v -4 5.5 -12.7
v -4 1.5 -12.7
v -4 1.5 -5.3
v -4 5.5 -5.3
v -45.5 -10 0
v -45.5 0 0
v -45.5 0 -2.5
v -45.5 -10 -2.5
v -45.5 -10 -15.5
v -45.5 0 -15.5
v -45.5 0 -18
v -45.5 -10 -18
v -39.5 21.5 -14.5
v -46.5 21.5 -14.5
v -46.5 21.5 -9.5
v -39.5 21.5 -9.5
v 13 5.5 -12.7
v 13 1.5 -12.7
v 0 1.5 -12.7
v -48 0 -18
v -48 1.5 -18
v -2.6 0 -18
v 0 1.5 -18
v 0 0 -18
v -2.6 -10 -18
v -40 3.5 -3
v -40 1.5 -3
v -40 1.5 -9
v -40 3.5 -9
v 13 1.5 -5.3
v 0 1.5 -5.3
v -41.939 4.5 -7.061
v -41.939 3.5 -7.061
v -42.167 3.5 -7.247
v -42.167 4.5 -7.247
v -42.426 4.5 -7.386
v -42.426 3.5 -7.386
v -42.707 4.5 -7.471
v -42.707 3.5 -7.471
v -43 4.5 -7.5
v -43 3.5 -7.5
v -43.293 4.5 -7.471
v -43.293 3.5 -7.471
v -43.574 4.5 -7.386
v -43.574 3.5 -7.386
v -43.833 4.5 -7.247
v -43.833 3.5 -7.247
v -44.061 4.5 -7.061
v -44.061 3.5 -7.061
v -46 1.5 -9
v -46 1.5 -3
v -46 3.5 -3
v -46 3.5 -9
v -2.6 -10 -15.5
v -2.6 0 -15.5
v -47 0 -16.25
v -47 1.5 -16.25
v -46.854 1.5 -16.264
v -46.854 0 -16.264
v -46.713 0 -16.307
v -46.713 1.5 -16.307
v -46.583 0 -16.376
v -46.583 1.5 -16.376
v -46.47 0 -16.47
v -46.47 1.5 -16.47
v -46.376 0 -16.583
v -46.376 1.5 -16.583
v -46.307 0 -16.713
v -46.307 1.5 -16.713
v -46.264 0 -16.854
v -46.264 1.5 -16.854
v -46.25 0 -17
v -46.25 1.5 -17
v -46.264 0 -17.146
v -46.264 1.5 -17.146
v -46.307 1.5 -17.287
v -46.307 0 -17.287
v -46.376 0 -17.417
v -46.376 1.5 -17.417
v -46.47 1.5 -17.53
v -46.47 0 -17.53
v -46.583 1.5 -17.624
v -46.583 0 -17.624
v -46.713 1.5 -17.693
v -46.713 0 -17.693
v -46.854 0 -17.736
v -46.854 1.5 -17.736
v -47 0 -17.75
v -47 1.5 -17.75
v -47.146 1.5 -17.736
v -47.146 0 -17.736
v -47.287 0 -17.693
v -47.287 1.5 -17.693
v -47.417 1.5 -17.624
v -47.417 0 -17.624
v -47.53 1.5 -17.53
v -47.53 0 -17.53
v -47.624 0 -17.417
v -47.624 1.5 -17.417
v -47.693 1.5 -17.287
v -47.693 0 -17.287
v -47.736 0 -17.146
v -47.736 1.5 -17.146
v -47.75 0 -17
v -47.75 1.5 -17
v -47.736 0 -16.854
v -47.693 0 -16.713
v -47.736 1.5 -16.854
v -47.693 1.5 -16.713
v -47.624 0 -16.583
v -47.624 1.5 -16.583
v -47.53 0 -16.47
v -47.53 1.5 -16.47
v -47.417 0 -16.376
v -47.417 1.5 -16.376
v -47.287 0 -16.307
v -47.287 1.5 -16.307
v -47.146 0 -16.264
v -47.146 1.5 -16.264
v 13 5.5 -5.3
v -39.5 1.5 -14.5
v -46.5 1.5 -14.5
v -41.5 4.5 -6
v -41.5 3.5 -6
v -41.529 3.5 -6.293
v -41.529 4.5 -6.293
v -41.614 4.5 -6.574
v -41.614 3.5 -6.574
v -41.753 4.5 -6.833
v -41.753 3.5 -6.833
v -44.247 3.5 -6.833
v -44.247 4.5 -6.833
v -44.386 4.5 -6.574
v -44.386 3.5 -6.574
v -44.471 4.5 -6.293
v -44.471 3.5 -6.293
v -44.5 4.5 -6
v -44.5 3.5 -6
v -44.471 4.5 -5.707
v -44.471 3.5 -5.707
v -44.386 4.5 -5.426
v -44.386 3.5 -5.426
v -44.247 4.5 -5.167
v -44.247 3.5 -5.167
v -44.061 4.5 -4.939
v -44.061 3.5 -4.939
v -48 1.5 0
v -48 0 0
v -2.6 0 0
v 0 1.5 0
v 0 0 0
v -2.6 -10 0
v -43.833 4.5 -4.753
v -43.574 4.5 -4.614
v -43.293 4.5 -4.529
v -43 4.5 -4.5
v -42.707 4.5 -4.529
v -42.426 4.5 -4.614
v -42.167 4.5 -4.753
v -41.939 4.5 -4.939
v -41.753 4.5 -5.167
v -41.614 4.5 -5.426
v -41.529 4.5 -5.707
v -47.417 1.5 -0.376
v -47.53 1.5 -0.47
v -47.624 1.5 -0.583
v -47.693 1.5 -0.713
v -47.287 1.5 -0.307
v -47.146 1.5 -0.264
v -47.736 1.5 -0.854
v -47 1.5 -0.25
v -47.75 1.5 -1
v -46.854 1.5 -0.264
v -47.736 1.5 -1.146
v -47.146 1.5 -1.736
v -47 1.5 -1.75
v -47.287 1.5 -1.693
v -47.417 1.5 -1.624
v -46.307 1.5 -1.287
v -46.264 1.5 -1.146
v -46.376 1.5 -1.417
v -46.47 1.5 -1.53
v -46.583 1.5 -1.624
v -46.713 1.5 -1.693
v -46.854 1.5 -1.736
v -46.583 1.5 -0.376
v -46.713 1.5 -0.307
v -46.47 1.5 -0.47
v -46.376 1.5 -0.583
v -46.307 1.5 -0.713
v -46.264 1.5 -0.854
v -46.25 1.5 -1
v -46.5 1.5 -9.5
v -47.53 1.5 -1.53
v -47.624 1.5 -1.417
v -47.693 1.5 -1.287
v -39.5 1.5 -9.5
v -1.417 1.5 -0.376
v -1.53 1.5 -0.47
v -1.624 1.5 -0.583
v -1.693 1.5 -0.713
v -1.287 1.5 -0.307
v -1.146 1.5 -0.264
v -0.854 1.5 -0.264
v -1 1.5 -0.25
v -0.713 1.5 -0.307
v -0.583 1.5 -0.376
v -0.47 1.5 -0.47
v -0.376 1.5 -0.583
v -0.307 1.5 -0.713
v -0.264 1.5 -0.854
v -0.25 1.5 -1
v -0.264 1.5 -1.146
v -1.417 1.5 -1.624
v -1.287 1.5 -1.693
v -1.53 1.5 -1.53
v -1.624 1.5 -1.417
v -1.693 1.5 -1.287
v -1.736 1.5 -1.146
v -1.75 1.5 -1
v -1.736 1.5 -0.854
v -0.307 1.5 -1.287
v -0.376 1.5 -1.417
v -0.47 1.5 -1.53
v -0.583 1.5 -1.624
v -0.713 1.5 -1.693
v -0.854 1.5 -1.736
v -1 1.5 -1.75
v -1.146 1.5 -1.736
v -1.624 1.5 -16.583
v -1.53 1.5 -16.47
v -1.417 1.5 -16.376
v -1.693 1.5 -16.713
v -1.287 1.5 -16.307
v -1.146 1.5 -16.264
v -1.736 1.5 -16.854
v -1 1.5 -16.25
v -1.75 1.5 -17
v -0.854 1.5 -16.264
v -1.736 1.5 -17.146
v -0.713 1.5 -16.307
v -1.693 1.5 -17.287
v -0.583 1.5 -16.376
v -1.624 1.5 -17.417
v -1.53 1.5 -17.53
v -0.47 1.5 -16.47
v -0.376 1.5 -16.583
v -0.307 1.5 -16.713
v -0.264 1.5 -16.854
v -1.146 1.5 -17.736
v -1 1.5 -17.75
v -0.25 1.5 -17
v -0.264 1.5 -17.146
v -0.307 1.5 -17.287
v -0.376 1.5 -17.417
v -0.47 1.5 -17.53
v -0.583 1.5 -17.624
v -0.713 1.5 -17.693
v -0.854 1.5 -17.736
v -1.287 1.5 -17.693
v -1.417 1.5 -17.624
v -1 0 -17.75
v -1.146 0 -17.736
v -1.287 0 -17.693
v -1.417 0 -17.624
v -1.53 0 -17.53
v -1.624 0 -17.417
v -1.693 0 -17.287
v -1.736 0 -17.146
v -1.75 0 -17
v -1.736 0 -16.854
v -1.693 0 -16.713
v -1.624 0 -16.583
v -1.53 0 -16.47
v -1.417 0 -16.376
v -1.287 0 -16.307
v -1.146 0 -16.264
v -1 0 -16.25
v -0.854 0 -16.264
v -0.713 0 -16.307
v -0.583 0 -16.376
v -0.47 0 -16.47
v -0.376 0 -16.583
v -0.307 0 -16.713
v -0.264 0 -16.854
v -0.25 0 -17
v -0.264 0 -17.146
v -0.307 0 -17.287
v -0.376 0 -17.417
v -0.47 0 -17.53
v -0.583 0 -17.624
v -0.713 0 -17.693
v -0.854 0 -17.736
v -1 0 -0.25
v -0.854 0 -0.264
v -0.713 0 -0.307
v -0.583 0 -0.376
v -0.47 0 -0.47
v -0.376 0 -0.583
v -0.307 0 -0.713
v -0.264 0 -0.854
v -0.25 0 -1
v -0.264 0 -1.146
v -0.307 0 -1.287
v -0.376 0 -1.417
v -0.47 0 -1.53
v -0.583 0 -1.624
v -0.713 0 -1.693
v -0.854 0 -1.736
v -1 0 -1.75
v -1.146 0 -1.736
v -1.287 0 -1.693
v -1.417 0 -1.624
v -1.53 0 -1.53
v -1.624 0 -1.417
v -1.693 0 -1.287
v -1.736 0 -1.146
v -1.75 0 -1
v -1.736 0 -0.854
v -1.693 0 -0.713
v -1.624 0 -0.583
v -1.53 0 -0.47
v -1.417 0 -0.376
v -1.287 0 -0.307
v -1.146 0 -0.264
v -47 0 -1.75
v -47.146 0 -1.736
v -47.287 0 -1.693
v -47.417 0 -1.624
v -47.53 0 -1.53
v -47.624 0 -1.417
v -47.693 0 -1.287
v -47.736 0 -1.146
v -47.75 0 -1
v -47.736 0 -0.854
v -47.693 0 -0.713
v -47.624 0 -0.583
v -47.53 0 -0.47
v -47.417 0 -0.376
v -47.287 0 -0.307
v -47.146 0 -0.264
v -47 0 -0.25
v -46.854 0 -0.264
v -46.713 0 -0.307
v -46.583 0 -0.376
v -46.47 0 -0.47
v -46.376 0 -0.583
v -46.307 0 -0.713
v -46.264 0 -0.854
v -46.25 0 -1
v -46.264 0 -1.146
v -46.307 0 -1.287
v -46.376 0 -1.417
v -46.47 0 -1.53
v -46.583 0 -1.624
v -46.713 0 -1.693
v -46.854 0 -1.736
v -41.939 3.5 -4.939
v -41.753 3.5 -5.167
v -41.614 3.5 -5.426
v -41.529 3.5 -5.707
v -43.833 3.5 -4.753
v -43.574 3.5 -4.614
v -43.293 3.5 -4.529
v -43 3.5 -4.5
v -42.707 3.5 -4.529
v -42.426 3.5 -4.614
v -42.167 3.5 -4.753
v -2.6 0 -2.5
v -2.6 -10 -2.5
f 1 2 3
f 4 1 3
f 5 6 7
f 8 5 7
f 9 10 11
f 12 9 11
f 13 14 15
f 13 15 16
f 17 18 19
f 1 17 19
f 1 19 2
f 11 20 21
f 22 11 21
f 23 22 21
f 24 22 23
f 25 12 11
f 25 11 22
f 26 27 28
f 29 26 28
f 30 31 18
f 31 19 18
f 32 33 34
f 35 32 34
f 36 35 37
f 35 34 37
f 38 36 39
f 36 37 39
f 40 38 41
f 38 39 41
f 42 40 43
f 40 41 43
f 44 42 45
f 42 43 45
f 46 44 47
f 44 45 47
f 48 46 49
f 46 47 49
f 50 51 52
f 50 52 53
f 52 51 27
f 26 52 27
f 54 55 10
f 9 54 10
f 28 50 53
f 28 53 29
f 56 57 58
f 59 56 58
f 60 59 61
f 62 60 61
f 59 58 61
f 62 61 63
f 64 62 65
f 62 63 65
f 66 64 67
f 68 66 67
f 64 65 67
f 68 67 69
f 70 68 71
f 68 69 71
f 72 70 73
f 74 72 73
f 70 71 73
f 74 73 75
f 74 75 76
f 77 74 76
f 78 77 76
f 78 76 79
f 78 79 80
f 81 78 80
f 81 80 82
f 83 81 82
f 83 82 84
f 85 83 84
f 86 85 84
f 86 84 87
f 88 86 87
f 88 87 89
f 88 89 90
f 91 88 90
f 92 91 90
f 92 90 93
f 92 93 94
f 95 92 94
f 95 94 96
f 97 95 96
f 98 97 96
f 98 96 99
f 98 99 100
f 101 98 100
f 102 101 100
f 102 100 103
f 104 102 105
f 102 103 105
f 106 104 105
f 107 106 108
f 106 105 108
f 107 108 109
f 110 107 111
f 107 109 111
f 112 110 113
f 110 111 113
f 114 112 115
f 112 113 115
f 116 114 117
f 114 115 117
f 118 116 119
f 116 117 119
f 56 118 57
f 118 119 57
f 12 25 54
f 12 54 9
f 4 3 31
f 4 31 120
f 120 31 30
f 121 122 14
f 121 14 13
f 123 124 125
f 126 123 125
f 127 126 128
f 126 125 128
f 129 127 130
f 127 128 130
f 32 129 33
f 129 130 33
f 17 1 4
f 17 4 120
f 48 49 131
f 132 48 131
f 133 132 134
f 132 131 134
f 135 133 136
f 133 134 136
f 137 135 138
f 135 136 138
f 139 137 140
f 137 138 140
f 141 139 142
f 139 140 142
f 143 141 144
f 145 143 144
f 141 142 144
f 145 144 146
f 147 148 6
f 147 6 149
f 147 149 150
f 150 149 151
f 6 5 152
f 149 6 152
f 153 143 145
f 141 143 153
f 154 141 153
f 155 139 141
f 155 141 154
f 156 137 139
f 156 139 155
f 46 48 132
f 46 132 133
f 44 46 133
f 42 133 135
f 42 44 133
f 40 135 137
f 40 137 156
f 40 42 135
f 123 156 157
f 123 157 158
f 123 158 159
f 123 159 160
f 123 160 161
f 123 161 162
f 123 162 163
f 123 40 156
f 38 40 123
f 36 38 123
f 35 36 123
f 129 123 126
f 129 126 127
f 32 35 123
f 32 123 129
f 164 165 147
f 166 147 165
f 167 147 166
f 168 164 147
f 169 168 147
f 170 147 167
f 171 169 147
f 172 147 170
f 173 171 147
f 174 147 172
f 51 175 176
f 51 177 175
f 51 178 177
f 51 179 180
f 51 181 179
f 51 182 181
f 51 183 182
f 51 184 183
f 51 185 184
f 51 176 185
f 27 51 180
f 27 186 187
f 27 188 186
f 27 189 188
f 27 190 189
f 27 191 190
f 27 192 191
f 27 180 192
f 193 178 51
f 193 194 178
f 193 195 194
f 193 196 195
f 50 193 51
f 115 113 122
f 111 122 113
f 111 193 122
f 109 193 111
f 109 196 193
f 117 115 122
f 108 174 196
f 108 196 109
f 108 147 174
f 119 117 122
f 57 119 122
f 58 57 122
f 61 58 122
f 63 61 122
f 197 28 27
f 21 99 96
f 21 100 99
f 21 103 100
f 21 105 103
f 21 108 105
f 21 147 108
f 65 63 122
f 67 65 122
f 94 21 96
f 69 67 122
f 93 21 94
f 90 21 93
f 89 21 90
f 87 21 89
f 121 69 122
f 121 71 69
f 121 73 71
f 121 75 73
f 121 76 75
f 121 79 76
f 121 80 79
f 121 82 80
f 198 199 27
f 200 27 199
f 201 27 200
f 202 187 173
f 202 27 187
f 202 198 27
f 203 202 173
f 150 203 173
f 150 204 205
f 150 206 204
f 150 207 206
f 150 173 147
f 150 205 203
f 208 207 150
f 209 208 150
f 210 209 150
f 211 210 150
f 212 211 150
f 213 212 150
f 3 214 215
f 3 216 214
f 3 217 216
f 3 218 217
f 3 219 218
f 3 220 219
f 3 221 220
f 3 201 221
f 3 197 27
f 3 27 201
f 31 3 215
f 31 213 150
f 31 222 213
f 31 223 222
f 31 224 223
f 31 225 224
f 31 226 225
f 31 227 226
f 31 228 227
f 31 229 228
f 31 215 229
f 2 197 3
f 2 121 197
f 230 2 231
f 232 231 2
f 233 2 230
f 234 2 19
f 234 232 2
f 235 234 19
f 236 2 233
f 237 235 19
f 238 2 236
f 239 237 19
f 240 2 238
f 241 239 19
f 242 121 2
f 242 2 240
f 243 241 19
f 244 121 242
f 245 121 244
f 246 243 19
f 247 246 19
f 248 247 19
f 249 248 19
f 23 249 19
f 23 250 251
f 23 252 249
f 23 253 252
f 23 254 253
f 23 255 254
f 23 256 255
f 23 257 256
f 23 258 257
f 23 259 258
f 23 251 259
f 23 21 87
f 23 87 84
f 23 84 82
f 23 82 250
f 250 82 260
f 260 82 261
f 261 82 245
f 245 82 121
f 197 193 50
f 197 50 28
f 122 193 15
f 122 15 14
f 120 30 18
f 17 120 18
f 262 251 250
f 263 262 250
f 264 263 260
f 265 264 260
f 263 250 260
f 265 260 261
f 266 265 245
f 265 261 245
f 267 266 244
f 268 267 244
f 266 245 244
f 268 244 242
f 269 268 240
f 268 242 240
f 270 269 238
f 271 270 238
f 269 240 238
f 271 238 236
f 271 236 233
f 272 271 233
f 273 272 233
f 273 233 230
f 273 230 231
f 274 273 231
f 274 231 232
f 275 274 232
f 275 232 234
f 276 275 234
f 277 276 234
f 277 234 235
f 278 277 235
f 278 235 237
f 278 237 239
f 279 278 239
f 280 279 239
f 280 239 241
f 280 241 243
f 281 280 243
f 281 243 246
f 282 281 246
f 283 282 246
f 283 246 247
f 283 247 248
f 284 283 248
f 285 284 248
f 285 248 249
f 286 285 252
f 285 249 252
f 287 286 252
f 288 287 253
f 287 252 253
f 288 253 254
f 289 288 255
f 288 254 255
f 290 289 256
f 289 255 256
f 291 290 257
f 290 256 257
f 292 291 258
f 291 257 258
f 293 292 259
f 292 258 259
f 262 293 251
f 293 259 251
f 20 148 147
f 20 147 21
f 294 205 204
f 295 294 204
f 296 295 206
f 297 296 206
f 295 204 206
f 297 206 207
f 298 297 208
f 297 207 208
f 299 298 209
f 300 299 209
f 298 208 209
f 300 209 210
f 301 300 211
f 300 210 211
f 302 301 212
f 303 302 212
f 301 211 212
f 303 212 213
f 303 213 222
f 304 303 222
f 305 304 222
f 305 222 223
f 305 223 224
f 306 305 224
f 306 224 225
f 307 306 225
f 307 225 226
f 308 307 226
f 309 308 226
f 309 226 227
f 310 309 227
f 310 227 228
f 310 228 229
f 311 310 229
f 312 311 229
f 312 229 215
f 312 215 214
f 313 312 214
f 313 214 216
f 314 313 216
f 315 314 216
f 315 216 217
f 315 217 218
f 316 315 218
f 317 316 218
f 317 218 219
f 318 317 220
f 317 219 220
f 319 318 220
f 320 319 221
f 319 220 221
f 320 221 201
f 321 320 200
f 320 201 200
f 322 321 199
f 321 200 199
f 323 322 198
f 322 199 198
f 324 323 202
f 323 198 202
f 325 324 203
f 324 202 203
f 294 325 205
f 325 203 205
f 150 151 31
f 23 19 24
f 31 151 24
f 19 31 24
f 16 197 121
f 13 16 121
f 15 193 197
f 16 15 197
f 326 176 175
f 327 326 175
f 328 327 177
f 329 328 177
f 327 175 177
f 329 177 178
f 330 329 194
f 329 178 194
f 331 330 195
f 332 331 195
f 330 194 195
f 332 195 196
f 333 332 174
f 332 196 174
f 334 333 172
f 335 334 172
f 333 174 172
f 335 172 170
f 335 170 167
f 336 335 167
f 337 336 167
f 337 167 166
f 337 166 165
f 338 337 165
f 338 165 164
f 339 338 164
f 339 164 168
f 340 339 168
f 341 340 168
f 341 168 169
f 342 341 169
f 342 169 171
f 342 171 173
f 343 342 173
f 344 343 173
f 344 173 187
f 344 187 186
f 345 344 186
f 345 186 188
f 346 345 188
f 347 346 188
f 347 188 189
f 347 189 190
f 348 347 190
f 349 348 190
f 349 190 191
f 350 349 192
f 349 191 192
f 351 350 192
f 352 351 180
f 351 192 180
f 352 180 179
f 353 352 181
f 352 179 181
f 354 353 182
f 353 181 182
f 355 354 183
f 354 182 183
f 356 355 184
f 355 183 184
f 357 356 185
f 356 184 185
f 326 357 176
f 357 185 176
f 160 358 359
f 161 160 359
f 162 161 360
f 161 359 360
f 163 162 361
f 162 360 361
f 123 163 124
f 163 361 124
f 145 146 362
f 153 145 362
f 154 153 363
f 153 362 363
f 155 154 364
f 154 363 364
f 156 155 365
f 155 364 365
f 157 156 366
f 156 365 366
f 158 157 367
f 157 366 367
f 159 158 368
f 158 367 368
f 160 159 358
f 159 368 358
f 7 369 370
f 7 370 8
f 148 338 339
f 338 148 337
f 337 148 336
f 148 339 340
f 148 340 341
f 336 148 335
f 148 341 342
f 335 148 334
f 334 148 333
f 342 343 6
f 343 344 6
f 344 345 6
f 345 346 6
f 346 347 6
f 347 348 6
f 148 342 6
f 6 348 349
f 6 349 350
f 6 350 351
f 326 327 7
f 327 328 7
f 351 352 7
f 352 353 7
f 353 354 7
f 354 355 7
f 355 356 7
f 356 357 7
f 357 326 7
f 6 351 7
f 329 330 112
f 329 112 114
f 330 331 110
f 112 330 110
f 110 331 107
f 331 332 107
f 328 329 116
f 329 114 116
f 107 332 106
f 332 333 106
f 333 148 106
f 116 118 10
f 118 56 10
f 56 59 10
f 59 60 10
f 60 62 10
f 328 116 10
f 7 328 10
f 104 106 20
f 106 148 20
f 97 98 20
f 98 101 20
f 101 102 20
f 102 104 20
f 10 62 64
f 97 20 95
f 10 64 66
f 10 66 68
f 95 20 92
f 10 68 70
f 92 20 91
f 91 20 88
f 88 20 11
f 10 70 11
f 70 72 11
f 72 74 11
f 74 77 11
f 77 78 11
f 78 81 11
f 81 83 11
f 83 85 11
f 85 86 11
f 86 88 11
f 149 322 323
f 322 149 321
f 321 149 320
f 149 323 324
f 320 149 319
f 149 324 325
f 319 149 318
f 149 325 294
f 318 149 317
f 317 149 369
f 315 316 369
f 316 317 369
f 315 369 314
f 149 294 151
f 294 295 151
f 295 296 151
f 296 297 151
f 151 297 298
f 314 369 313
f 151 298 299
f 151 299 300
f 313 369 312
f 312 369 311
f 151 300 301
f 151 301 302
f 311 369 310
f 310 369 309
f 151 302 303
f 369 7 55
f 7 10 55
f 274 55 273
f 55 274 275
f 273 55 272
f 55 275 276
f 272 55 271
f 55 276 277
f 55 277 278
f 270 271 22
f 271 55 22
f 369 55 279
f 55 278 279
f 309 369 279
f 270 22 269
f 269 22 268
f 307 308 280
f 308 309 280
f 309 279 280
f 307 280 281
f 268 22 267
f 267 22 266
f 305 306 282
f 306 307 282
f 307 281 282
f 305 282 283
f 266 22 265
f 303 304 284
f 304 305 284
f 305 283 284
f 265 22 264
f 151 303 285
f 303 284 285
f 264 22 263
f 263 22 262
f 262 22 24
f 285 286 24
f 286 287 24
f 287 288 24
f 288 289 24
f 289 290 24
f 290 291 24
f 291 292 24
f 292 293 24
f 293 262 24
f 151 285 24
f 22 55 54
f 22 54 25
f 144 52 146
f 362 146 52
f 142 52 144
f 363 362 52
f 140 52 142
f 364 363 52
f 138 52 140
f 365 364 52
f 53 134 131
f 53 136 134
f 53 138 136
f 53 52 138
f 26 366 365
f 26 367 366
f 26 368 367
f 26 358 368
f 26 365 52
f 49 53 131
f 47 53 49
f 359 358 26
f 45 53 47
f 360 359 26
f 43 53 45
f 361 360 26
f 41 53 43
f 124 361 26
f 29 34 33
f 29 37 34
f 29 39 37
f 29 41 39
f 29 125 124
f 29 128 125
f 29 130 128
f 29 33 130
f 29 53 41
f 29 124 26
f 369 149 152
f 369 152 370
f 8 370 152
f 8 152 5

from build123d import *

# Parameters (mm, degrees)
SKETCH_1_W          = 48
SKETCH_1_H          = 18
EXTRUDE_1_DEPTH     = 1.5
EXTRUDE_2_DEPTH     = 4
SKETCH_4_W          = 42.9
SKETCH_4_H          = 2.5
EXTRUDE_3_DEPTH     = 10
SKETCH_5_W          = 7
SKETCH_5_H          = 5
EXTRUDE_4_DEPTH     = 20
SKETCH_6_W          = 6
SKETCH_6_H          = 6
EXTRUDE_5_DEPTH     = 2
EXTRUDE_6_DEPTH     = 1
SKETCH_8_R          = 0.75
CUT_EXTRUDE_1_DEPTH = 10


with BuildPart() as part:
    # Эскиз1 → Бобышка-Вытянуть1 (new body)
    with BuildSketch(Plane(origin=(0, 0, 0), x_dir=(1, 0, 0), z_dir=(0, 1, 0))):
        with Locations((-24, 9)):
            Rectangle(SKETCH_1_W, SKETCH_1_H)
    extrude(amount=EXTRUDE_1_DEPTH)

    # Эскиз2 → Бобышка-Вытянуть2 (add)
    with BuildSketch(Plane(origin=(0, 1.5, 0), x_dir=(1, 0, 0), z_dir=(0, 1, 0))):
        Polygon((0, 12.7), (0, 9), (0, 5.3), (13, 5.3), (13, 12.7), align=None)
        Polygon((0, 5.3), (0, 9), (0, 12.7), (-4, 12.7), (-4, 5.3), align=None)
    extrude(amount=EXTRUDE_2_DEPTH)

    # Эскиз4 → Бобышка-Вытянуть3 (add)
    with BuildSketch(Plane(origin=(0, 0, 0), x_dir=(-1, 0, 0), z_dir=(0, -1, 0))):
        with Locations((24.05, 16.75)):
            Rectangle(SKETCH_4_W, SKETCH_4_H)
        with Locations((24.05, 1.25)):
            Rectangle(SKETCH_4_W, SKETCH_4_H)
    extrude(amount=EXTRUDE_3_DEPTH)

    # Эскиз5 → Бобышка-Вытянуть4 (add)
    with BuildSketch(Plane(origin=(0, 1.5, 0), x_dir=(1, 0, 0), z_dir=(0, 1, 0))):
        with Locations((-43, 12)):
            Rectangle(SKETCH_5_W, SKETCH_5_H)
    extrude(amount=EXTRUDE_4_DEPTH)

    # Эскиз6 → Бобышка-Вытянуть5 (add)
    with BuildSketch(Plane(origin=(0, 1.5, 0), x_dir=(1, 0, 0), z_dir=(0, 1, 0))):
        with Locations((-43, 6)):
            Rectangle(SKETCH_6_W, SKETCH_6_H)
    extrude(amount=EXTRUDE_5_DEPTH)

    # Эскиз7 → Бобышка-Вытянуть6 (add)
    with BuildSketch(Plane(origin=(0, 3.5, 0), x_dir=(1, 0, 0), z_dir=(0, 1, 0))):
        with BuildLine():
            ThreePointArc((-41.939339828, 7.060660172), (-43, 7.5), (-44.060660172, 7.060660172))
            Line((-44.060660172, 7.060660172), (-43, 6))
            Line((-43, 6), (-41.939339828, 7.060660172))
        make_face()
        with BuildLine():
            Line((-43, 6), (-44.060660172, 7.060660172))
            ThreePointArc((-44.060660172, 7.060660172), (-44.5, 6), (-44.060660172, 4.939339828))
            Line((-44.060660172, 4.939339828), (-43, 6))
        make_face()
        with BuildLine():
            Line((-41.939339828, 7.060660172), (-43, 6))
            Line((-43, 6), (-41.939339828, 4.939339828))
            ThreePointArc((-41.939339828, 4.939339828), (-41.614180701, 5.425974851), (-41.5, 6))
            ThreePointArc((-41.5, 6), (-41.614180701, 6.574025149), (-41.939339828, 7.060660172))
        make_face()
        with BuildLine():
            Line((-41.939339828, 4.939339828), (-43, 6))
            Line((-43, 6), (-44.060660172, 4.939339828))
            ThreePointArc((-44.060660172, 4.939339828), (-43, 4.5), (-41.939339828, 4.939339828))
        make_face()
    extrude(amount=EXTRUDE_6_DEPTH)

    # Эскиз8 → Вырез-Вытянуть1 (cut)
    with BuildSketch(Plane(origin=(0, 1.5, 0), x_dir=(1, 0, 0), z_dir=(0, 1, 0))):
        with Locations(Location((-47, 17, 0), (0, 0, 270))):
            Circle(SKETCH_8_R)
        with Locations(Location((-47, 1, 0), (0, 0, 90))):
            Circle(SKETCH_8_R)
        with Locations(Location((-1, 1, 0), (0, 0, 270))):
            Circle(SKETCH_8_R)
        with Locations(Location((-1, 17, 0), (0, 0, 90))):
            Circle(SKETCH_8_R)
    extrude(amount=-CUT_EXTRUDE_1_DEPTH, mode=Mode.SUBTRACT)


solid = part.part
